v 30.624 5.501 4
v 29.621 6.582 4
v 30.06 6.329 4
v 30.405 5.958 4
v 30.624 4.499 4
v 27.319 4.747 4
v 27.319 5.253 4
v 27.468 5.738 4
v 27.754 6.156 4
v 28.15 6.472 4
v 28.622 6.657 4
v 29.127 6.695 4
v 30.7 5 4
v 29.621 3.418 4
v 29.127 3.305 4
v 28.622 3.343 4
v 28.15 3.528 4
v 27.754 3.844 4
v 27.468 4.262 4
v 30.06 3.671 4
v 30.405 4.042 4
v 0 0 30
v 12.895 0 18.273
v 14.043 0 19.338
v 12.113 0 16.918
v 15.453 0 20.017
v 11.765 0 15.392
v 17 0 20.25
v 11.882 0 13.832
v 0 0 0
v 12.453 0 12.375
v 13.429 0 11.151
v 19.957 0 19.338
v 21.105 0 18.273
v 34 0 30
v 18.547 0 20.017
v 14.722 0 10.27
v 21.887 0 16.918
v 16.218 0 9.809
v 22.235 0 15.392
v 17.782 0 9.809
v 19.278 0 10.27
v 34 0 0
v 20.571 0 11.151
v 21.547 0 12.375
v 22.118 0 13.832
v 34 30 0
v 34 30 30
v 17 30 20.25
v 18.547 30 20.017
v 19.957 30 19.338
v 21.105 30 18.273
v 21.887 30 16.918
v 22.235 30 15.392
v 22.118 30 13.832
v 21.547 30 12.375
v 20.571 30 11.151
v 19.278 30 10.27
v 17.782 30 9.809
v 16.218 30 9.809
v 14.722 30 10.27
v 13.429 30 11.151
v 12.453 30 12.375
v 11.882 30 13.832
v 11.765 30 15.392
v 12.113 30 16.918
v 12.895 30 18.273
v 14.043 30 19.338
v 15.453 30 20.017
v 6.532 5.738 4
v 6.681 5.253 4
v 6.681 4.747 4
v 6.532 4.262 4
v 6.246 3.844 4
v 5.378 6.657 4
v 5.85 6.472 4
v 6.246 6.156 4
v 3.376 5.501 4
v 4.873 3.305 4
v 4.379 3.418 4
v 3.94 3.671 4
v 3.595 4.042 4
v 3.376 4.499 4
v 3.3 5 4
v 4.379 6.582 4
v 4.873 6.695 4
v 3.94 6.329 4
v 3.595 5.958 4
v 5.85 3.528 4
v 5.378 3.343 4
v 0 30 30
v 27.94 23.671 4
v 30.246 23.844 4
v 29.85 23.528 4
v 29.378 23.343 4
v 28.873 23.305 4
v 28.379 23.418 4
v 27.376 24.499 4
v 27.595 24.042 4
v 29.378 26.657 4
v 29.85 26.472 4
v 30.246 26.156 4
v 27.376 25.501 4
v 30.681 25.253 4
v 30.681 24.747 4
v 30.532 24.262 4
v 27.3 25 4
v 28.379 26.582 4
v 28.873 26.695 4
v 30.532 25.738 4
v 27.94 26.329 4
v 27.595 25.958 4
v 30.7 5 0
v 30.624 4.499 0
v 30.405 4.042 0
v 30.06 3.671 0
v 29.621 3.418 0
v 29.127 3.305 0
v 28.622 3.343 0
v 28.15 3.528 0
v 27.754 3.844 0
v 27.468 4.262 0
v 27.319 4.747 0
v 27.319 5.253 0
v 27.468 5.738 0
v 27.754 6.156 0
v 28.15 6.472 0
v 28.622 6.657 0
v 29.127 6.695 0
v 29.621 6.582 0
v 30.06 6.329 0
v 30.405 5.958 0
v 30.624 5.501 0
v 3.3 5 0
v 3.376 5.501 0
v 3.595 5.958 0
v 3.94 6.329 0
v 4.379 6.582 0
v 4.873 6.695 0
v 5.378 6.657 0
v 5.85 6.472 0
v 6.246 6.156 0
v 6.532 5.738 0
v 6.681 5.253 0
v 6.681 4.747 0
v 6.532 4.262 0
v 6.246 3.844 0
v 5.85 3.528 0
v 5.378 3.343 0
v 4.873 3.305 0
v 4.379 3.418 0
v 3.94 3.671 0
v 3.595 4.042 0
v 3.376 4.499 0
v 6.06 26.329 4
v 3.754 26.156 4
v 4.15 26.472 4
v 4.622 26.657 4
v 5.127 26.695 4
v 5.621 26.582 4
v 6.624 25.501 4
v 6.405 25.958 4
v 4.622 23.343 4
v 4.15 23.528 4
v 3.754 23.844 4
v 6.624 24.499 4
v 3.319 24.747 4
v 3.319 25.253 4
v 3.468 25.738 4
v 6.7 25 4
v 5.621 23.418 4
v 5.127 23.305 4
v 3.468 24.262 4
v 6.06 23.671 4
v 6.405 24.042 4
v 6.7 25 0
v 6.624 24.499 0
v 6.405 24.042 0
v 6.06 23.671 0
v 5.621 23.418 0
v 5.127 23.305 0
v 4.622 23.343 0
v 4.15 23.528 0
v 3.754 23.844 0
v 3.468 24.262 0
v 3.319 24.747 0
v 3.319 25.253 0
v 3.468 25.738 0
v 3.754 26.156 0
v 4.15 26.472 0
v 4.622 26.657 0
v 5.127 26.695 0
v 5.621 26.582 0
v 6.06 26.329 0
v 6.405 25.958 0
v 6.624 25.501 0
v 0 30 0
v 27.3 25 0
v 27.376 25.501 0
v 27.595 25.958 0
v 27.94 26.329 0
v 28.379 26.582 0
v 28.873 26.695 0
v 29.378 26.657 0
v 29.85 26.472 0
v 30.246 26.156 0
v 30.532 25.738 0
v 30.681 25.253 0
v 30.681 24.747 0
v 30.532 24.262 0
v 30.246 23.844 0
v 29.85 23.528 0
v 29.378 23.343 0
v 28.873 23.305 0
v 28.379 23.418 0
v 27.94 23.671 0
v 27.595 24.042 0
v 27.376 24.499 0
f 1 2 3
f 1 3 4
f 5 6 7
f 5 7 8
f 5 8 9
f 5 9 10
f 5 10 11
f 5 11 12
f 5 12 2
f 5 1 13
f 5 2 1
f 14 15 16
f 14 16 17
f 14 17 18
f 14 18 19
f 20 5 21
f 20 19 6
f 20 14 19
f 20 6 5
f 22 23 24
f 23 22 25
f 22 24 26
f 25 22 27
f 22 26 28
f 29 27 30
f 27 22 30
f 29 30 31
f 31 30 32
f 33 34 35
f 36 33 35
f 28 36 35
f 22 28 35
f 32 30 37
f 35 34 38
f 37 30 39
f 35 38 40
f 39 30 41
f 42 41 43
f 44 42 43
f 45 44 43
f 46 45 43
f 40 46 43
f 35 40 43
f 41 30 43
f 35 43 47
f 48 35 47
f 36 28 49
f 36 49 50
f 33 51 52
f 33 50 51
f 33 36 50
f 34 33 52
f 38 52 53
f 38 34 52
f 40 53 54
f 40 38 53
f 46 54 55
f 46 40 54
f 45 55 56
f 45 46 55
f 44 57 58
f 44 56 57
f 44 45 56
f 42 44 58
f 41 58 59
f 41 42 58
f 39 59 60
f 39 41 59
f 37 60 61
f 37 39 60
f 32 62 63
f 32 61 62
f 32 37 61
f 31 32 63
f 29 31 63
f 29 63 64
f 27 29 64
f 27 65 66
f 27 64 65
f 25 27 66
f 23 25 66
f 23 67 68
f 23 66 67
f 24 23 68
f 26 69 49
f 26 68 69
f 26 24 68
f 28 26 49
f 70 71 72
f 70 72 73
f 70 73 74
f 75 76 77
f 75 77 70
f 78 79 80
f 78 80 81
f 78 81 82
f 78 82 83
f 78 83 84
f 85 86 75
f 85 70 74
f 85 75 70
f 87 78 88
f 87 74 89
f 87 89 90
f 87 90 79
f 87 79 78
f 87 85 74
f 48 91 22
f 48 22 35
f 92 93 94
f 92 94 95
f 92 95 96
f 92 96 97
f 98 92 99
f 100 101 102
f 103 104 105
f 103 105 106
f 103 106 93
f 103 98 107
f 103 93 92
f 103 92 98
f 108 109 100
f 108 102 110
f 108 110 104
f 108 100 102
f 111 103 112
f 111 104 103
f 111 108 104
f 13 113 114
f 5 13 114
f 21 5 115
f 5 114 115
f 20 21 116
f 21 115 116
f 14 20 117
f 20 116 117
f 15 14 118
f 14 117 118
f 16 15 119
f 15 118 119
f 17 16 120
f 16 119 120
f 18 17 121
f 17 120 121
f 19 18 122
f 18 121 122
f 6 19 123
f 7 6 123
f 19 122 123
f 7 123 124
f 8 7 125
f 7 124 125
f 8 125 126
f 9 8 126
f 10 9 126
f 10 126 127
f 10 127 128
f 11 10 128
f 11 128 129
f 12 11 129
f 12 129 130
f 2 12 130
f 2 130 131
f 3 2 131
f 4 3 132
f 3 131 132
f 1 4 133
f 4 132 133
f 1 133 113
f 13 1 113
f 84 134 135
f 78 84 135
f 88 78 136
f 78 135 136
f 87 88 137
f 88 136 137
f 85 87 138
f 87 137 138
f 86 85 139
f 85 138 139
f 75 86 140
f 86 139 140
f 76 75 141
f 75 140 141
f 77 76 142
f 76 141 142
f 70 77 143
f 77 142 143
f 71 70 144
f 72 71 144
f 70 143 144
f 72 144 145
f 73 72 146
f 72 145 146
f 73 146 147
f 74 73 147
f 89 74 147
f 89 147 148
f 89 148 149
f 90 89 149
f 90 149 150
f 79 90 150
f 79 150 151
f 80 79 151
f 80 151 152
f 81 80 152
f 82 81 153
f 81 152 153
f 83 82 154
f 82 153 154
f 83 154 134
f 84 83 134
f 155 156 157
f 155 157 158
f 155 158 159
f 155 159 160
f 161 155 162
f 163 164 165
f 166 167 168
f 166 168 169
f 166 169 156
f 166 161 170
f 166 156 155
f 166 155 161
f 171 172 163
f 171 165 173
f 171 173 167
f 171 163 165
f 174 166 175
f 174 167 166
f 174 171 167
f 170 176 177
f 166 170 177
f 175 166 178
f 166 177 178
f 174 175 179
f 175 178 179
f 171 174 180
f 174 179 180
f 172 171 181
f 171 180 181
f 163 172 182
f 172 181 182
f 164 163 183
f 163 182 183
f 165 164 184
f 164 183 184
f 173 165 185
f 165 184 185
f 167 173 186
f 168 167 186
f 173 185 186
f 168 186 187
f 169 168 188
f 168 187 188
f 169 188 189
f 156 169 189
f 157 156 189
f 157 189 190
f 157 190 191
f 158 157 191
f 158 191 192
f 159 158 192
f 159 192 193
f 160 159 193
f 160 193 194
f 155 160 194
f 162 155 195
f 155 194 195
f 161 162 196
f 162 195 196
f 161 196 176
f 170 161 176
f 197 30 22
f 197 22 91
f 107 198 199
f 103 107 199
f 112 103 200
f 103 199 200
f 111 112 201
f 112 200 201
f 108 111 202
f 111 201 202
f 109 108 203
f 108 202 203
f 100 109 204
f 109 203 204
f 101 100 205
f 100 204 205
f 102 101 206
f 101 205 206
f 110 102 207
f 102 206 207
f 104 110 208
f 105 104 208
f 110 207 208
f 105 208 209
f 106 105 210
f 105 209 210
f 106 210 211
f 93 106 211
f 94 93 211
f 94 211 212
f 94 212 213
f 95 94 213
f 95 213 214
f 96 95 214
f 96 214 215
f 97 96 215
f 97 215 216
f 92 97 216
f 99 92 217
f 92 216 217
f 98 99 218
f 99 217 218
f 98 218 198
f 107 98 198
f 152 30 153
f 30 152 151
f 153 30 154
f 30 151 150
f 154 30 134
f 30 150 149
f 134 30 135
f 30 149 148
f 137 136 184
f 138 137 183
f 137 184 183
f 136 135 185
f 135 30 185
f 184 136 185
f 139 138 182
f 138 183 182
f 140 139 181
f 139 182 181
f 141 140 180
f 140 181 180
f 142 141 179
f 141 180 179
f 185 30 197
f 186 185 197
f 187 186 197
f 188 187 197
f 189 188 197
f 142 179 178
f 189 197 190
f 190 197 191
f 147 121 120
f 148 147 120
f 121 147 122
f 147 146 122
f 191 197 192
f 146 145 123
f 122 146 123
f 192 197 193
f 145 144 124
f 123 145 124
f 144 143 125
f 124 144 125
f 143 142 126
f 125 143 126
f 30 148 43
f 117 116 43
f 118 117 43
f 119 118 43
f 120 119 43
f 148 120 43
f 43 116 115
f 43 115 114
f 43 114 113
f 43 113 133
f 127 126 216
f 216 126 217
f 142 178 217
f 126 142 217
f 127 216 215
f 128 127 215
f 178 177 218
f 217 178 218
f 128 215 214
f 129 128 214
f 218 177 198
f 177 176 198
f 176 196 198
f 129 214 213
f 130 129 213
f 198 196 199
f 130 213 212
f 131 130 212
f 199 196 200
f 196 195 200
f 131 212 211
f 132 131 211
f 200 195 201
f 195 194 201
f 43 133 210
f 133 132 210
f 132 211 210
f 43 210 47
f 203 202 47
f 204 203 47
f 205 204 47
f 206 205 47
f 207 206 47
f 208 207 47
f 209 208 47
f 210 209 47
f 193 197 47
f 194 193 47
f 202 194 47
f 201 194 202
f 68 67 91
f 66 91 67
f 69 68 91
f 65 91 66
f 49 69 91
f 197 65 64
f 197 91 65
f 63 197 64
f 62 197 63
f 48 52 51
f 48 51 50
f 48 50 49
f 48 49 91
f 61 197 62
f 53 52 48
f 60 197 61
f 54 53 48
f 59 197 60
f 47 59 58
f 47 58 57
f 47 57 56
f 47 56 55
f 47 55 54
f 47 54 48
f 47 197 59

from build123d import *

# Parameters (mm, degrees)
SKETCH_1_W               = 34
SKETCH_1_H               = 30
EXTRUDE_1_DEPTH          = 30
CUT_EXTRUDE_1_DEPTH      = 55.369108876
CUT_EXTRUDE_1_DEPTH_BACK = 55.369108876
SKETCH_2_R               = 5.25
SKETCH_3_R               = 1.7
CUT_EXTRUDE_2_DEPTH      = 4


with BuildPart() as part:
    # 草图1 → 凸台-拉伸1 (new body)
    with BuildSketch(Plane.XY):
        with Locations((17, 15)):
            Rectangle(SKETCH_1_W, SKETCH_1_H)
    extrude(amount=EXTRUDE_1_DEPTH)

    # 草图2 → 切除-拉伸1 (cut, two sides: drawn at the far end of the back side and taken through both)
    with BuildSketch(Plane(origin=(0, 30, 0), x_dir=(1, 0, 0), z_dir=(0, 1, 0)).offset(-CUT_EXTRUDE_1_DEPTH_BACK)):
        with Locations(Location((17, -15, 0), (0, 0, 270))):
            Circle(SKETCH_2_R)
    extrude(amount=CUT_EXTRUDE_1_DEPTH + CUT_EXTRUDE_1_DEPTH_BACK, mode=Mode.SUBTRACT)

    # 草图3 → 切除-拉伸2 (cut)
    with BuildSketch(Plane(origin=(0, 0, 0), x_dir=(-1, 0, 0), z_dir=(0, 0, -1))):
        with Locations((-29, 25)):
            Circle(SKETCH_3_R)
        with Locations(Location((-29, 5, 0), (0, 0, 180))):
            Circle(SKETCH_3_R)
        with Locations((-5, 5)):
            Circle(SKETCH_3_R)
        with Locations(Location((-5, 25, 0), (0, 0, 180))):
            Circle(SKETCH_3_R)
    extrude(amount=-CUT_EXTRUDE_2_DEPTH, mode=Mode.SUBTRACT)


solid = part.part
